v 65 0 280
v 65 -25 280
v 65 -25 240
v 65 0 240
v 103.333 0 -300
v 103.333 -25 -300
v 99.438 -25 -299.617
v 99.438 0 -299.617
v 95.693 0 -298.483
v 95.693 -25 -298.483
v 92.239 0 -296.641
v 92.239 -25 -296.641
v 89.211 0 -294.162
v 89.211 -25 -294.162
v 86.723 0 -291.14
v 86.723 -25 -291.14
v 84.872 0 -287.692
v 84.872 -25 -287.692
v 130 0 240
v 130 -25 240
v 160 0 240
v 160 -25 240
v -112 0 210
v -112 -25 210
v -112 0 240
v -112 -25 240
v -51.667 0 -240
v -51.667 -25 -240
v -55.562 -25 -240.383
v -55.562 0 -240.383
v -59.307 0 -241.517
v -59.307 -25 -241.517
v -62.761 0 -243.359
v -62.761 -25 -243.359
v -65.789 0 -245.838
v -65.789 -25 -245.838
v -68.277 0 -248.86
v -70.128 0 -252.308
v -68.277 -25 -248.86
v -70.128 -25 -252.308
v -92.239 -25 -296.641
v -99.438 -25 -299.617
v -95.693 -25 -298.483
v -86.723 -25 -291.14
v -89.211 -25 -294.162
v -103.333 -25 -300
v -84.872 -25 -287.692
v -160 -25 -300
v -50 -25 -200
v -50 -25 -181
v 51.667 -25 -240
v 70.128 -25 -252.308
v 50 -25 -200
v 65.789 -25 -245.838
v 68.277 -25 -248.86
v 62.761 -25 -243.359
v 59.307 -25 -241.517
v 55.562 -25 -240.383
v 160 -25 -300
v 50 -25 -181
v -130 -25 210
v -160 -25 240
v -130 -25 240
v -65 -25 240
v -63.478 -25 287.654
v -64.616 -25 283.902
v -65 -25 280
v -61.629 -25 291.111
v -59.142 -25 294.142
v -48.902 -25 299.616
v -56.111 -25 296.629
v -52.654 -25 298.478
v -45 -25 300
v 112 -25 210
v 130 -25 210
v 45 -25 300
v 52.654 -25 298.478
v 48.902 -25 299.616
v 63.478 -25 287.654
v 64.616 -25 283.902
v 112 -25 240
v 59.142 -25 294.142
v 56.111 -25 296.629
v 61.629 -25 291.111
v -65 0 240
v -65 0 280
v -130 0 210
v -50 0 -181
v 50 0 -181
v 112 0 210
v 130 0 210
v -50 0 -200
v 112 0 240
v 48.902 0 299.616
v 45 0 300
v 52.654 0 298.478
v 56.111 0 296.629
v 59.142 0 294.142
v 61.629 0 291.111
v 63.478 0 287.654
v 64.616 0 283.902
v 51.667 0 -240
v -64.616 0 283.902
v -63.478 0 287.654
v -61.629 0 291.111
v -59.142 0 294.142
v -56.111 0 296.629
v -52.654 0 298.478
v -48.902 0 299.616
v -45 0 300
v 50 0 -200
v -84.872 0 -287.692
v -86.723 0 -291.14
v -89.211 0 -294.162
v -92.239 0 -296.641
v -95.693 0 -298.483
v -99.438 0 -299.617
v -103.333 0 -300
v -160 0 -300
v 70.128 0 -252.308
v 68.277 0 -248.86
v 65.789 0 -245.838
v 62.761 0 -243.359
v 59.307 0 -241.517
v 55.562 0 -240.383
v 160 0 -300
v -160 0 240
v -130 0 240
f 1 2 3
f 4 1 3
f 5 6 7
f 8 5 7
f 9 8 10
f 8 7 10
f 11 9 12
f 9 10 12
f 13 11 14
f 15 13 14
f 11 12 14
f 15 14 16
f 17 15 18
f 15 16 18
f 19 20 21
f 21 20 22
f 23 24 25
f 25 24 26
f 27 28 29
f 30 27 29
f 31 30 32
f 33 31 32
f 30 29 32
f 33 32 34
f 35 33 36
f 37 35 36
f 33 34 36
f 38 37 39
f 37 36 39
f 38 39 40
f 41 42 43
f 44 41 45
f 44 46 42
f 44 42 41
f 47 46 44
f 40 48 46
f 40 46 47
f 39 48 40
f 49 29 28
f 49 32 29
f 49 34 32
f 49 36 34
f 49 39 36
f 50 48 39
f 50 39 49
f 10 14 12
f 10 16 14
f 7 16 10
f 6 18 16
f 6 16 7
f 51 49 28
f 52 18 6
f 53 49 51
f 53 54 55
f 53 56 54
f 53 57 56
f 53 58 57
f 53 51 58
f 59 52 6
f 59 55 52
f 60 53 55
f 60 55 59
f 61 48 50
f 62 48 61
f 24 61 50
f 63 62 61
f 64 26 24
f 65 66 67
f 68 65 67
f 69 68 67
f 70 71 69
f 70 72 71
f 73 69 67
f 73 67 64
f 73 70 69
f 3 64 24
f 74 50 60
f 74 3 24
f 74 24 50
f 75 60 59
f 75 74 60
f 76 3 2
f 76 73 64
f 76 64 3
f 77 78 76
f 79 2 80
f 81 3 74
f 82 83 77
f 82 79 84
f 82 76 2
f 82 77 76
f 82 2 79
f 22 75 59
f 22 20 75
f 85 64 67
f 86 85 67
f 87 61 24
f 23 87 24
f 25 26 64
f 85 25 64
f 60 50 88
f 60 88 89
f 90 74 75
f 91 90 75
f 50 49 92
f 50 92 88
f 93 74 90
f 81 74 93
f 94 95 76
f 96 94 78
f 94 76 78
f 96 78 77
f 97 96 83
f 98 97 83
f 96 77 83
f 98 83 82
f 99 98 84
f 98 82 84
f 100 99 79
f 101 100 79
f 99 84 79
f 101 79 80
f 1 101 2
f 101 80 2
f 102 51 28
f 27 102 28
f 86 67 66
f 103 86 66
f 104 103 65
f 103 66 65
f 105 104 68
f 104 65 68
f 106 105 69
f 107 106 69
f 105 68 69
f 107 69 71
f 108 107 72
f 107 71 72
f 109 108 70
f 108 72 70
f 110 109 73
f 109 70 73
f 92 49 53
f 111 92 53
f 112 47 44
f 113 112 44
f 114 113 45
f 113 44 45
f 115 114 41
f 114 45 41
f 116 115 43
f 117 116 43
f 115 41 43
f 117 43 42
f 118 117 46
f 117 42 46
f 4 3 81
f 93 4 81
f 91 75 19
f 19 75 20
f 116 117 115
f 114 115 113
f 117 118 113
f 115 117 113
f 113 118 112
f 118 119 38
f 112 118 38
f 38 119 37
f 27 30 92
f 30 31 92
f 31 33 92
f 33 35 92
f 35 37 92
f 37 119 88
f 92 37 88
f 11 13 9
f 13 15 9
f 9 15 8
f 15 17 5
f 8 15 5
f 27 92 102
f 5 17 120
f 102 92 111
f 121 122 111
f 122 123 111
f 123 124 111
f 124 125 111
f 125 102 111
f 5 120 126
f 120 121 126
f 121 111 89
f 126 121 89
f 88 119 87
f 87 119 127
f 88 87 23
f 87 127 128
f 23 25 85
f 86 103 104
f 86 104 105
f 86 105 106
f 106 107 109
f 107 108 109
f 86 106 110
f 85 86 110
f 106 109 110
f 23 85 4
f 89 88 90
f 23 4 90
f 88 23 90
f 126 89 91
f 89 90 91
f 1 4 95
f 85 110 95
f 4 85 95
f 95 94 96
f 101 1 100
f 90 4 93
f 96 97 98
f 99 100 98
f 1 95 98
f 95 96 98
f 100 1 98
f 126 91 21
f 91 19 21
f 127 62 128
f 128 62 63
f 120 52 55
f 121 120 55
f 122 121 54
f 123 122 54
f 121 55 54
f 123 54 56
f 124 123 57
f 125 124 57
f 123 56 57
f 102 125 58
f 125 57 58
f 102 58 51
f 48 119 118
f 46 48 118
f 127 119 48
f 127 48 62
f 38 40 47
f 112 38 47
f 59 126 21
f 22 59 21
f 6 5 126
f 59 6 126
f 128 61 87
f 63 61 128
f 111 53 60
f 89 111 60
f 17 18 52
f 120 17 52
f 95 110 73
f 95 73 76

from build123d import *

# Parameters (mm, degrees)
F0_W     = 320
F0_H     = 600
F1_DEPTH = 25
F2_W     = 100
F2_H     = 19
F2_W_2   = 18
F2_H_2   = 30
F3_DEPTH = 25


with BuildPart() as f1:
    # F0 (on Front) → F1 (new body)
    with BuildSketch(Plane.XZ):
        Rectangle(F0_W, F0_H)
    extrude(amount=F1_DEPTH)

    # F2 (on face) → F3 (cut, through all)
    with BuildSketch(Plane.XZ.offset(25)):
        with BuildLine():
            Line((-160, 300), (-160, 240))
            Line((-160, 240), (-130, 240))
            Line((-130, 240), (-112, 240))
            Line((-112, 240), (-85, 240))
            Line((-85, 240), (-65, 240))
            Line((-65, 240), (-65, 260))
            Line((-65, 260), (-65, 280))
            ThreePointArc((-65, 280), (-59.142136, 294.142136), (-45, 300))
            Line((-45, 300), (-160, 300))
        make_face()
        with BuildLine():
            Line((130, 240), (160, 240))
            Line((160, 240), (160, 300))
            Line((160, 300), (45, 300))
            ThreePointArc((45, 300), (59.142136, 294.142136), (65, 280))
            Line((65, 280), (65, 260))
            Line((65, 260), (65, 240))
            Line((65, 240), (85, 240))
            Line((85, 240), (112, 240))
            Line((112, 240), (130, 240))
        make_face()
        with BuildLine():
            Line((-70.128205, -252.307692), (-84.871795, -287.692308))
            ThreePointArc((-84.871795, -287.692308), (-92.239329, -296.641006), (-103.333333, -300))
            Line((-103.333333, -300), (103.333333, -300))
            ThreePointArc((103.333333, -300), (92.239329, -296.641006), (84.871795, -287.692308))
            Line((84.871795, -287.692308), (70.128205, -252.307692))
            ThreePointArc((70.128205, -252.307692), (62.760671, -243.358994), (51.666667, -240))
            Line((51.666667, -240), (-51.666667, -240))
            ThreePointArc((-51.666667, -240), (-62.760671, -243.358994), (-70.128205, -252.307692))
        make_face()
        with Locations((0, -190.5)):
            Rectangle(F2_W, F2_H)
        with Locations((-121, 225)):
            Rectangle(F2_W_2, F2_H_2)
        with Locations((121, 225)):
            Rectangle(F2_W_2, F2_H_2)
    extrude(amount=-F3_DEPTH, mode=Mode.SUBTRACT)


solid = f1.part
